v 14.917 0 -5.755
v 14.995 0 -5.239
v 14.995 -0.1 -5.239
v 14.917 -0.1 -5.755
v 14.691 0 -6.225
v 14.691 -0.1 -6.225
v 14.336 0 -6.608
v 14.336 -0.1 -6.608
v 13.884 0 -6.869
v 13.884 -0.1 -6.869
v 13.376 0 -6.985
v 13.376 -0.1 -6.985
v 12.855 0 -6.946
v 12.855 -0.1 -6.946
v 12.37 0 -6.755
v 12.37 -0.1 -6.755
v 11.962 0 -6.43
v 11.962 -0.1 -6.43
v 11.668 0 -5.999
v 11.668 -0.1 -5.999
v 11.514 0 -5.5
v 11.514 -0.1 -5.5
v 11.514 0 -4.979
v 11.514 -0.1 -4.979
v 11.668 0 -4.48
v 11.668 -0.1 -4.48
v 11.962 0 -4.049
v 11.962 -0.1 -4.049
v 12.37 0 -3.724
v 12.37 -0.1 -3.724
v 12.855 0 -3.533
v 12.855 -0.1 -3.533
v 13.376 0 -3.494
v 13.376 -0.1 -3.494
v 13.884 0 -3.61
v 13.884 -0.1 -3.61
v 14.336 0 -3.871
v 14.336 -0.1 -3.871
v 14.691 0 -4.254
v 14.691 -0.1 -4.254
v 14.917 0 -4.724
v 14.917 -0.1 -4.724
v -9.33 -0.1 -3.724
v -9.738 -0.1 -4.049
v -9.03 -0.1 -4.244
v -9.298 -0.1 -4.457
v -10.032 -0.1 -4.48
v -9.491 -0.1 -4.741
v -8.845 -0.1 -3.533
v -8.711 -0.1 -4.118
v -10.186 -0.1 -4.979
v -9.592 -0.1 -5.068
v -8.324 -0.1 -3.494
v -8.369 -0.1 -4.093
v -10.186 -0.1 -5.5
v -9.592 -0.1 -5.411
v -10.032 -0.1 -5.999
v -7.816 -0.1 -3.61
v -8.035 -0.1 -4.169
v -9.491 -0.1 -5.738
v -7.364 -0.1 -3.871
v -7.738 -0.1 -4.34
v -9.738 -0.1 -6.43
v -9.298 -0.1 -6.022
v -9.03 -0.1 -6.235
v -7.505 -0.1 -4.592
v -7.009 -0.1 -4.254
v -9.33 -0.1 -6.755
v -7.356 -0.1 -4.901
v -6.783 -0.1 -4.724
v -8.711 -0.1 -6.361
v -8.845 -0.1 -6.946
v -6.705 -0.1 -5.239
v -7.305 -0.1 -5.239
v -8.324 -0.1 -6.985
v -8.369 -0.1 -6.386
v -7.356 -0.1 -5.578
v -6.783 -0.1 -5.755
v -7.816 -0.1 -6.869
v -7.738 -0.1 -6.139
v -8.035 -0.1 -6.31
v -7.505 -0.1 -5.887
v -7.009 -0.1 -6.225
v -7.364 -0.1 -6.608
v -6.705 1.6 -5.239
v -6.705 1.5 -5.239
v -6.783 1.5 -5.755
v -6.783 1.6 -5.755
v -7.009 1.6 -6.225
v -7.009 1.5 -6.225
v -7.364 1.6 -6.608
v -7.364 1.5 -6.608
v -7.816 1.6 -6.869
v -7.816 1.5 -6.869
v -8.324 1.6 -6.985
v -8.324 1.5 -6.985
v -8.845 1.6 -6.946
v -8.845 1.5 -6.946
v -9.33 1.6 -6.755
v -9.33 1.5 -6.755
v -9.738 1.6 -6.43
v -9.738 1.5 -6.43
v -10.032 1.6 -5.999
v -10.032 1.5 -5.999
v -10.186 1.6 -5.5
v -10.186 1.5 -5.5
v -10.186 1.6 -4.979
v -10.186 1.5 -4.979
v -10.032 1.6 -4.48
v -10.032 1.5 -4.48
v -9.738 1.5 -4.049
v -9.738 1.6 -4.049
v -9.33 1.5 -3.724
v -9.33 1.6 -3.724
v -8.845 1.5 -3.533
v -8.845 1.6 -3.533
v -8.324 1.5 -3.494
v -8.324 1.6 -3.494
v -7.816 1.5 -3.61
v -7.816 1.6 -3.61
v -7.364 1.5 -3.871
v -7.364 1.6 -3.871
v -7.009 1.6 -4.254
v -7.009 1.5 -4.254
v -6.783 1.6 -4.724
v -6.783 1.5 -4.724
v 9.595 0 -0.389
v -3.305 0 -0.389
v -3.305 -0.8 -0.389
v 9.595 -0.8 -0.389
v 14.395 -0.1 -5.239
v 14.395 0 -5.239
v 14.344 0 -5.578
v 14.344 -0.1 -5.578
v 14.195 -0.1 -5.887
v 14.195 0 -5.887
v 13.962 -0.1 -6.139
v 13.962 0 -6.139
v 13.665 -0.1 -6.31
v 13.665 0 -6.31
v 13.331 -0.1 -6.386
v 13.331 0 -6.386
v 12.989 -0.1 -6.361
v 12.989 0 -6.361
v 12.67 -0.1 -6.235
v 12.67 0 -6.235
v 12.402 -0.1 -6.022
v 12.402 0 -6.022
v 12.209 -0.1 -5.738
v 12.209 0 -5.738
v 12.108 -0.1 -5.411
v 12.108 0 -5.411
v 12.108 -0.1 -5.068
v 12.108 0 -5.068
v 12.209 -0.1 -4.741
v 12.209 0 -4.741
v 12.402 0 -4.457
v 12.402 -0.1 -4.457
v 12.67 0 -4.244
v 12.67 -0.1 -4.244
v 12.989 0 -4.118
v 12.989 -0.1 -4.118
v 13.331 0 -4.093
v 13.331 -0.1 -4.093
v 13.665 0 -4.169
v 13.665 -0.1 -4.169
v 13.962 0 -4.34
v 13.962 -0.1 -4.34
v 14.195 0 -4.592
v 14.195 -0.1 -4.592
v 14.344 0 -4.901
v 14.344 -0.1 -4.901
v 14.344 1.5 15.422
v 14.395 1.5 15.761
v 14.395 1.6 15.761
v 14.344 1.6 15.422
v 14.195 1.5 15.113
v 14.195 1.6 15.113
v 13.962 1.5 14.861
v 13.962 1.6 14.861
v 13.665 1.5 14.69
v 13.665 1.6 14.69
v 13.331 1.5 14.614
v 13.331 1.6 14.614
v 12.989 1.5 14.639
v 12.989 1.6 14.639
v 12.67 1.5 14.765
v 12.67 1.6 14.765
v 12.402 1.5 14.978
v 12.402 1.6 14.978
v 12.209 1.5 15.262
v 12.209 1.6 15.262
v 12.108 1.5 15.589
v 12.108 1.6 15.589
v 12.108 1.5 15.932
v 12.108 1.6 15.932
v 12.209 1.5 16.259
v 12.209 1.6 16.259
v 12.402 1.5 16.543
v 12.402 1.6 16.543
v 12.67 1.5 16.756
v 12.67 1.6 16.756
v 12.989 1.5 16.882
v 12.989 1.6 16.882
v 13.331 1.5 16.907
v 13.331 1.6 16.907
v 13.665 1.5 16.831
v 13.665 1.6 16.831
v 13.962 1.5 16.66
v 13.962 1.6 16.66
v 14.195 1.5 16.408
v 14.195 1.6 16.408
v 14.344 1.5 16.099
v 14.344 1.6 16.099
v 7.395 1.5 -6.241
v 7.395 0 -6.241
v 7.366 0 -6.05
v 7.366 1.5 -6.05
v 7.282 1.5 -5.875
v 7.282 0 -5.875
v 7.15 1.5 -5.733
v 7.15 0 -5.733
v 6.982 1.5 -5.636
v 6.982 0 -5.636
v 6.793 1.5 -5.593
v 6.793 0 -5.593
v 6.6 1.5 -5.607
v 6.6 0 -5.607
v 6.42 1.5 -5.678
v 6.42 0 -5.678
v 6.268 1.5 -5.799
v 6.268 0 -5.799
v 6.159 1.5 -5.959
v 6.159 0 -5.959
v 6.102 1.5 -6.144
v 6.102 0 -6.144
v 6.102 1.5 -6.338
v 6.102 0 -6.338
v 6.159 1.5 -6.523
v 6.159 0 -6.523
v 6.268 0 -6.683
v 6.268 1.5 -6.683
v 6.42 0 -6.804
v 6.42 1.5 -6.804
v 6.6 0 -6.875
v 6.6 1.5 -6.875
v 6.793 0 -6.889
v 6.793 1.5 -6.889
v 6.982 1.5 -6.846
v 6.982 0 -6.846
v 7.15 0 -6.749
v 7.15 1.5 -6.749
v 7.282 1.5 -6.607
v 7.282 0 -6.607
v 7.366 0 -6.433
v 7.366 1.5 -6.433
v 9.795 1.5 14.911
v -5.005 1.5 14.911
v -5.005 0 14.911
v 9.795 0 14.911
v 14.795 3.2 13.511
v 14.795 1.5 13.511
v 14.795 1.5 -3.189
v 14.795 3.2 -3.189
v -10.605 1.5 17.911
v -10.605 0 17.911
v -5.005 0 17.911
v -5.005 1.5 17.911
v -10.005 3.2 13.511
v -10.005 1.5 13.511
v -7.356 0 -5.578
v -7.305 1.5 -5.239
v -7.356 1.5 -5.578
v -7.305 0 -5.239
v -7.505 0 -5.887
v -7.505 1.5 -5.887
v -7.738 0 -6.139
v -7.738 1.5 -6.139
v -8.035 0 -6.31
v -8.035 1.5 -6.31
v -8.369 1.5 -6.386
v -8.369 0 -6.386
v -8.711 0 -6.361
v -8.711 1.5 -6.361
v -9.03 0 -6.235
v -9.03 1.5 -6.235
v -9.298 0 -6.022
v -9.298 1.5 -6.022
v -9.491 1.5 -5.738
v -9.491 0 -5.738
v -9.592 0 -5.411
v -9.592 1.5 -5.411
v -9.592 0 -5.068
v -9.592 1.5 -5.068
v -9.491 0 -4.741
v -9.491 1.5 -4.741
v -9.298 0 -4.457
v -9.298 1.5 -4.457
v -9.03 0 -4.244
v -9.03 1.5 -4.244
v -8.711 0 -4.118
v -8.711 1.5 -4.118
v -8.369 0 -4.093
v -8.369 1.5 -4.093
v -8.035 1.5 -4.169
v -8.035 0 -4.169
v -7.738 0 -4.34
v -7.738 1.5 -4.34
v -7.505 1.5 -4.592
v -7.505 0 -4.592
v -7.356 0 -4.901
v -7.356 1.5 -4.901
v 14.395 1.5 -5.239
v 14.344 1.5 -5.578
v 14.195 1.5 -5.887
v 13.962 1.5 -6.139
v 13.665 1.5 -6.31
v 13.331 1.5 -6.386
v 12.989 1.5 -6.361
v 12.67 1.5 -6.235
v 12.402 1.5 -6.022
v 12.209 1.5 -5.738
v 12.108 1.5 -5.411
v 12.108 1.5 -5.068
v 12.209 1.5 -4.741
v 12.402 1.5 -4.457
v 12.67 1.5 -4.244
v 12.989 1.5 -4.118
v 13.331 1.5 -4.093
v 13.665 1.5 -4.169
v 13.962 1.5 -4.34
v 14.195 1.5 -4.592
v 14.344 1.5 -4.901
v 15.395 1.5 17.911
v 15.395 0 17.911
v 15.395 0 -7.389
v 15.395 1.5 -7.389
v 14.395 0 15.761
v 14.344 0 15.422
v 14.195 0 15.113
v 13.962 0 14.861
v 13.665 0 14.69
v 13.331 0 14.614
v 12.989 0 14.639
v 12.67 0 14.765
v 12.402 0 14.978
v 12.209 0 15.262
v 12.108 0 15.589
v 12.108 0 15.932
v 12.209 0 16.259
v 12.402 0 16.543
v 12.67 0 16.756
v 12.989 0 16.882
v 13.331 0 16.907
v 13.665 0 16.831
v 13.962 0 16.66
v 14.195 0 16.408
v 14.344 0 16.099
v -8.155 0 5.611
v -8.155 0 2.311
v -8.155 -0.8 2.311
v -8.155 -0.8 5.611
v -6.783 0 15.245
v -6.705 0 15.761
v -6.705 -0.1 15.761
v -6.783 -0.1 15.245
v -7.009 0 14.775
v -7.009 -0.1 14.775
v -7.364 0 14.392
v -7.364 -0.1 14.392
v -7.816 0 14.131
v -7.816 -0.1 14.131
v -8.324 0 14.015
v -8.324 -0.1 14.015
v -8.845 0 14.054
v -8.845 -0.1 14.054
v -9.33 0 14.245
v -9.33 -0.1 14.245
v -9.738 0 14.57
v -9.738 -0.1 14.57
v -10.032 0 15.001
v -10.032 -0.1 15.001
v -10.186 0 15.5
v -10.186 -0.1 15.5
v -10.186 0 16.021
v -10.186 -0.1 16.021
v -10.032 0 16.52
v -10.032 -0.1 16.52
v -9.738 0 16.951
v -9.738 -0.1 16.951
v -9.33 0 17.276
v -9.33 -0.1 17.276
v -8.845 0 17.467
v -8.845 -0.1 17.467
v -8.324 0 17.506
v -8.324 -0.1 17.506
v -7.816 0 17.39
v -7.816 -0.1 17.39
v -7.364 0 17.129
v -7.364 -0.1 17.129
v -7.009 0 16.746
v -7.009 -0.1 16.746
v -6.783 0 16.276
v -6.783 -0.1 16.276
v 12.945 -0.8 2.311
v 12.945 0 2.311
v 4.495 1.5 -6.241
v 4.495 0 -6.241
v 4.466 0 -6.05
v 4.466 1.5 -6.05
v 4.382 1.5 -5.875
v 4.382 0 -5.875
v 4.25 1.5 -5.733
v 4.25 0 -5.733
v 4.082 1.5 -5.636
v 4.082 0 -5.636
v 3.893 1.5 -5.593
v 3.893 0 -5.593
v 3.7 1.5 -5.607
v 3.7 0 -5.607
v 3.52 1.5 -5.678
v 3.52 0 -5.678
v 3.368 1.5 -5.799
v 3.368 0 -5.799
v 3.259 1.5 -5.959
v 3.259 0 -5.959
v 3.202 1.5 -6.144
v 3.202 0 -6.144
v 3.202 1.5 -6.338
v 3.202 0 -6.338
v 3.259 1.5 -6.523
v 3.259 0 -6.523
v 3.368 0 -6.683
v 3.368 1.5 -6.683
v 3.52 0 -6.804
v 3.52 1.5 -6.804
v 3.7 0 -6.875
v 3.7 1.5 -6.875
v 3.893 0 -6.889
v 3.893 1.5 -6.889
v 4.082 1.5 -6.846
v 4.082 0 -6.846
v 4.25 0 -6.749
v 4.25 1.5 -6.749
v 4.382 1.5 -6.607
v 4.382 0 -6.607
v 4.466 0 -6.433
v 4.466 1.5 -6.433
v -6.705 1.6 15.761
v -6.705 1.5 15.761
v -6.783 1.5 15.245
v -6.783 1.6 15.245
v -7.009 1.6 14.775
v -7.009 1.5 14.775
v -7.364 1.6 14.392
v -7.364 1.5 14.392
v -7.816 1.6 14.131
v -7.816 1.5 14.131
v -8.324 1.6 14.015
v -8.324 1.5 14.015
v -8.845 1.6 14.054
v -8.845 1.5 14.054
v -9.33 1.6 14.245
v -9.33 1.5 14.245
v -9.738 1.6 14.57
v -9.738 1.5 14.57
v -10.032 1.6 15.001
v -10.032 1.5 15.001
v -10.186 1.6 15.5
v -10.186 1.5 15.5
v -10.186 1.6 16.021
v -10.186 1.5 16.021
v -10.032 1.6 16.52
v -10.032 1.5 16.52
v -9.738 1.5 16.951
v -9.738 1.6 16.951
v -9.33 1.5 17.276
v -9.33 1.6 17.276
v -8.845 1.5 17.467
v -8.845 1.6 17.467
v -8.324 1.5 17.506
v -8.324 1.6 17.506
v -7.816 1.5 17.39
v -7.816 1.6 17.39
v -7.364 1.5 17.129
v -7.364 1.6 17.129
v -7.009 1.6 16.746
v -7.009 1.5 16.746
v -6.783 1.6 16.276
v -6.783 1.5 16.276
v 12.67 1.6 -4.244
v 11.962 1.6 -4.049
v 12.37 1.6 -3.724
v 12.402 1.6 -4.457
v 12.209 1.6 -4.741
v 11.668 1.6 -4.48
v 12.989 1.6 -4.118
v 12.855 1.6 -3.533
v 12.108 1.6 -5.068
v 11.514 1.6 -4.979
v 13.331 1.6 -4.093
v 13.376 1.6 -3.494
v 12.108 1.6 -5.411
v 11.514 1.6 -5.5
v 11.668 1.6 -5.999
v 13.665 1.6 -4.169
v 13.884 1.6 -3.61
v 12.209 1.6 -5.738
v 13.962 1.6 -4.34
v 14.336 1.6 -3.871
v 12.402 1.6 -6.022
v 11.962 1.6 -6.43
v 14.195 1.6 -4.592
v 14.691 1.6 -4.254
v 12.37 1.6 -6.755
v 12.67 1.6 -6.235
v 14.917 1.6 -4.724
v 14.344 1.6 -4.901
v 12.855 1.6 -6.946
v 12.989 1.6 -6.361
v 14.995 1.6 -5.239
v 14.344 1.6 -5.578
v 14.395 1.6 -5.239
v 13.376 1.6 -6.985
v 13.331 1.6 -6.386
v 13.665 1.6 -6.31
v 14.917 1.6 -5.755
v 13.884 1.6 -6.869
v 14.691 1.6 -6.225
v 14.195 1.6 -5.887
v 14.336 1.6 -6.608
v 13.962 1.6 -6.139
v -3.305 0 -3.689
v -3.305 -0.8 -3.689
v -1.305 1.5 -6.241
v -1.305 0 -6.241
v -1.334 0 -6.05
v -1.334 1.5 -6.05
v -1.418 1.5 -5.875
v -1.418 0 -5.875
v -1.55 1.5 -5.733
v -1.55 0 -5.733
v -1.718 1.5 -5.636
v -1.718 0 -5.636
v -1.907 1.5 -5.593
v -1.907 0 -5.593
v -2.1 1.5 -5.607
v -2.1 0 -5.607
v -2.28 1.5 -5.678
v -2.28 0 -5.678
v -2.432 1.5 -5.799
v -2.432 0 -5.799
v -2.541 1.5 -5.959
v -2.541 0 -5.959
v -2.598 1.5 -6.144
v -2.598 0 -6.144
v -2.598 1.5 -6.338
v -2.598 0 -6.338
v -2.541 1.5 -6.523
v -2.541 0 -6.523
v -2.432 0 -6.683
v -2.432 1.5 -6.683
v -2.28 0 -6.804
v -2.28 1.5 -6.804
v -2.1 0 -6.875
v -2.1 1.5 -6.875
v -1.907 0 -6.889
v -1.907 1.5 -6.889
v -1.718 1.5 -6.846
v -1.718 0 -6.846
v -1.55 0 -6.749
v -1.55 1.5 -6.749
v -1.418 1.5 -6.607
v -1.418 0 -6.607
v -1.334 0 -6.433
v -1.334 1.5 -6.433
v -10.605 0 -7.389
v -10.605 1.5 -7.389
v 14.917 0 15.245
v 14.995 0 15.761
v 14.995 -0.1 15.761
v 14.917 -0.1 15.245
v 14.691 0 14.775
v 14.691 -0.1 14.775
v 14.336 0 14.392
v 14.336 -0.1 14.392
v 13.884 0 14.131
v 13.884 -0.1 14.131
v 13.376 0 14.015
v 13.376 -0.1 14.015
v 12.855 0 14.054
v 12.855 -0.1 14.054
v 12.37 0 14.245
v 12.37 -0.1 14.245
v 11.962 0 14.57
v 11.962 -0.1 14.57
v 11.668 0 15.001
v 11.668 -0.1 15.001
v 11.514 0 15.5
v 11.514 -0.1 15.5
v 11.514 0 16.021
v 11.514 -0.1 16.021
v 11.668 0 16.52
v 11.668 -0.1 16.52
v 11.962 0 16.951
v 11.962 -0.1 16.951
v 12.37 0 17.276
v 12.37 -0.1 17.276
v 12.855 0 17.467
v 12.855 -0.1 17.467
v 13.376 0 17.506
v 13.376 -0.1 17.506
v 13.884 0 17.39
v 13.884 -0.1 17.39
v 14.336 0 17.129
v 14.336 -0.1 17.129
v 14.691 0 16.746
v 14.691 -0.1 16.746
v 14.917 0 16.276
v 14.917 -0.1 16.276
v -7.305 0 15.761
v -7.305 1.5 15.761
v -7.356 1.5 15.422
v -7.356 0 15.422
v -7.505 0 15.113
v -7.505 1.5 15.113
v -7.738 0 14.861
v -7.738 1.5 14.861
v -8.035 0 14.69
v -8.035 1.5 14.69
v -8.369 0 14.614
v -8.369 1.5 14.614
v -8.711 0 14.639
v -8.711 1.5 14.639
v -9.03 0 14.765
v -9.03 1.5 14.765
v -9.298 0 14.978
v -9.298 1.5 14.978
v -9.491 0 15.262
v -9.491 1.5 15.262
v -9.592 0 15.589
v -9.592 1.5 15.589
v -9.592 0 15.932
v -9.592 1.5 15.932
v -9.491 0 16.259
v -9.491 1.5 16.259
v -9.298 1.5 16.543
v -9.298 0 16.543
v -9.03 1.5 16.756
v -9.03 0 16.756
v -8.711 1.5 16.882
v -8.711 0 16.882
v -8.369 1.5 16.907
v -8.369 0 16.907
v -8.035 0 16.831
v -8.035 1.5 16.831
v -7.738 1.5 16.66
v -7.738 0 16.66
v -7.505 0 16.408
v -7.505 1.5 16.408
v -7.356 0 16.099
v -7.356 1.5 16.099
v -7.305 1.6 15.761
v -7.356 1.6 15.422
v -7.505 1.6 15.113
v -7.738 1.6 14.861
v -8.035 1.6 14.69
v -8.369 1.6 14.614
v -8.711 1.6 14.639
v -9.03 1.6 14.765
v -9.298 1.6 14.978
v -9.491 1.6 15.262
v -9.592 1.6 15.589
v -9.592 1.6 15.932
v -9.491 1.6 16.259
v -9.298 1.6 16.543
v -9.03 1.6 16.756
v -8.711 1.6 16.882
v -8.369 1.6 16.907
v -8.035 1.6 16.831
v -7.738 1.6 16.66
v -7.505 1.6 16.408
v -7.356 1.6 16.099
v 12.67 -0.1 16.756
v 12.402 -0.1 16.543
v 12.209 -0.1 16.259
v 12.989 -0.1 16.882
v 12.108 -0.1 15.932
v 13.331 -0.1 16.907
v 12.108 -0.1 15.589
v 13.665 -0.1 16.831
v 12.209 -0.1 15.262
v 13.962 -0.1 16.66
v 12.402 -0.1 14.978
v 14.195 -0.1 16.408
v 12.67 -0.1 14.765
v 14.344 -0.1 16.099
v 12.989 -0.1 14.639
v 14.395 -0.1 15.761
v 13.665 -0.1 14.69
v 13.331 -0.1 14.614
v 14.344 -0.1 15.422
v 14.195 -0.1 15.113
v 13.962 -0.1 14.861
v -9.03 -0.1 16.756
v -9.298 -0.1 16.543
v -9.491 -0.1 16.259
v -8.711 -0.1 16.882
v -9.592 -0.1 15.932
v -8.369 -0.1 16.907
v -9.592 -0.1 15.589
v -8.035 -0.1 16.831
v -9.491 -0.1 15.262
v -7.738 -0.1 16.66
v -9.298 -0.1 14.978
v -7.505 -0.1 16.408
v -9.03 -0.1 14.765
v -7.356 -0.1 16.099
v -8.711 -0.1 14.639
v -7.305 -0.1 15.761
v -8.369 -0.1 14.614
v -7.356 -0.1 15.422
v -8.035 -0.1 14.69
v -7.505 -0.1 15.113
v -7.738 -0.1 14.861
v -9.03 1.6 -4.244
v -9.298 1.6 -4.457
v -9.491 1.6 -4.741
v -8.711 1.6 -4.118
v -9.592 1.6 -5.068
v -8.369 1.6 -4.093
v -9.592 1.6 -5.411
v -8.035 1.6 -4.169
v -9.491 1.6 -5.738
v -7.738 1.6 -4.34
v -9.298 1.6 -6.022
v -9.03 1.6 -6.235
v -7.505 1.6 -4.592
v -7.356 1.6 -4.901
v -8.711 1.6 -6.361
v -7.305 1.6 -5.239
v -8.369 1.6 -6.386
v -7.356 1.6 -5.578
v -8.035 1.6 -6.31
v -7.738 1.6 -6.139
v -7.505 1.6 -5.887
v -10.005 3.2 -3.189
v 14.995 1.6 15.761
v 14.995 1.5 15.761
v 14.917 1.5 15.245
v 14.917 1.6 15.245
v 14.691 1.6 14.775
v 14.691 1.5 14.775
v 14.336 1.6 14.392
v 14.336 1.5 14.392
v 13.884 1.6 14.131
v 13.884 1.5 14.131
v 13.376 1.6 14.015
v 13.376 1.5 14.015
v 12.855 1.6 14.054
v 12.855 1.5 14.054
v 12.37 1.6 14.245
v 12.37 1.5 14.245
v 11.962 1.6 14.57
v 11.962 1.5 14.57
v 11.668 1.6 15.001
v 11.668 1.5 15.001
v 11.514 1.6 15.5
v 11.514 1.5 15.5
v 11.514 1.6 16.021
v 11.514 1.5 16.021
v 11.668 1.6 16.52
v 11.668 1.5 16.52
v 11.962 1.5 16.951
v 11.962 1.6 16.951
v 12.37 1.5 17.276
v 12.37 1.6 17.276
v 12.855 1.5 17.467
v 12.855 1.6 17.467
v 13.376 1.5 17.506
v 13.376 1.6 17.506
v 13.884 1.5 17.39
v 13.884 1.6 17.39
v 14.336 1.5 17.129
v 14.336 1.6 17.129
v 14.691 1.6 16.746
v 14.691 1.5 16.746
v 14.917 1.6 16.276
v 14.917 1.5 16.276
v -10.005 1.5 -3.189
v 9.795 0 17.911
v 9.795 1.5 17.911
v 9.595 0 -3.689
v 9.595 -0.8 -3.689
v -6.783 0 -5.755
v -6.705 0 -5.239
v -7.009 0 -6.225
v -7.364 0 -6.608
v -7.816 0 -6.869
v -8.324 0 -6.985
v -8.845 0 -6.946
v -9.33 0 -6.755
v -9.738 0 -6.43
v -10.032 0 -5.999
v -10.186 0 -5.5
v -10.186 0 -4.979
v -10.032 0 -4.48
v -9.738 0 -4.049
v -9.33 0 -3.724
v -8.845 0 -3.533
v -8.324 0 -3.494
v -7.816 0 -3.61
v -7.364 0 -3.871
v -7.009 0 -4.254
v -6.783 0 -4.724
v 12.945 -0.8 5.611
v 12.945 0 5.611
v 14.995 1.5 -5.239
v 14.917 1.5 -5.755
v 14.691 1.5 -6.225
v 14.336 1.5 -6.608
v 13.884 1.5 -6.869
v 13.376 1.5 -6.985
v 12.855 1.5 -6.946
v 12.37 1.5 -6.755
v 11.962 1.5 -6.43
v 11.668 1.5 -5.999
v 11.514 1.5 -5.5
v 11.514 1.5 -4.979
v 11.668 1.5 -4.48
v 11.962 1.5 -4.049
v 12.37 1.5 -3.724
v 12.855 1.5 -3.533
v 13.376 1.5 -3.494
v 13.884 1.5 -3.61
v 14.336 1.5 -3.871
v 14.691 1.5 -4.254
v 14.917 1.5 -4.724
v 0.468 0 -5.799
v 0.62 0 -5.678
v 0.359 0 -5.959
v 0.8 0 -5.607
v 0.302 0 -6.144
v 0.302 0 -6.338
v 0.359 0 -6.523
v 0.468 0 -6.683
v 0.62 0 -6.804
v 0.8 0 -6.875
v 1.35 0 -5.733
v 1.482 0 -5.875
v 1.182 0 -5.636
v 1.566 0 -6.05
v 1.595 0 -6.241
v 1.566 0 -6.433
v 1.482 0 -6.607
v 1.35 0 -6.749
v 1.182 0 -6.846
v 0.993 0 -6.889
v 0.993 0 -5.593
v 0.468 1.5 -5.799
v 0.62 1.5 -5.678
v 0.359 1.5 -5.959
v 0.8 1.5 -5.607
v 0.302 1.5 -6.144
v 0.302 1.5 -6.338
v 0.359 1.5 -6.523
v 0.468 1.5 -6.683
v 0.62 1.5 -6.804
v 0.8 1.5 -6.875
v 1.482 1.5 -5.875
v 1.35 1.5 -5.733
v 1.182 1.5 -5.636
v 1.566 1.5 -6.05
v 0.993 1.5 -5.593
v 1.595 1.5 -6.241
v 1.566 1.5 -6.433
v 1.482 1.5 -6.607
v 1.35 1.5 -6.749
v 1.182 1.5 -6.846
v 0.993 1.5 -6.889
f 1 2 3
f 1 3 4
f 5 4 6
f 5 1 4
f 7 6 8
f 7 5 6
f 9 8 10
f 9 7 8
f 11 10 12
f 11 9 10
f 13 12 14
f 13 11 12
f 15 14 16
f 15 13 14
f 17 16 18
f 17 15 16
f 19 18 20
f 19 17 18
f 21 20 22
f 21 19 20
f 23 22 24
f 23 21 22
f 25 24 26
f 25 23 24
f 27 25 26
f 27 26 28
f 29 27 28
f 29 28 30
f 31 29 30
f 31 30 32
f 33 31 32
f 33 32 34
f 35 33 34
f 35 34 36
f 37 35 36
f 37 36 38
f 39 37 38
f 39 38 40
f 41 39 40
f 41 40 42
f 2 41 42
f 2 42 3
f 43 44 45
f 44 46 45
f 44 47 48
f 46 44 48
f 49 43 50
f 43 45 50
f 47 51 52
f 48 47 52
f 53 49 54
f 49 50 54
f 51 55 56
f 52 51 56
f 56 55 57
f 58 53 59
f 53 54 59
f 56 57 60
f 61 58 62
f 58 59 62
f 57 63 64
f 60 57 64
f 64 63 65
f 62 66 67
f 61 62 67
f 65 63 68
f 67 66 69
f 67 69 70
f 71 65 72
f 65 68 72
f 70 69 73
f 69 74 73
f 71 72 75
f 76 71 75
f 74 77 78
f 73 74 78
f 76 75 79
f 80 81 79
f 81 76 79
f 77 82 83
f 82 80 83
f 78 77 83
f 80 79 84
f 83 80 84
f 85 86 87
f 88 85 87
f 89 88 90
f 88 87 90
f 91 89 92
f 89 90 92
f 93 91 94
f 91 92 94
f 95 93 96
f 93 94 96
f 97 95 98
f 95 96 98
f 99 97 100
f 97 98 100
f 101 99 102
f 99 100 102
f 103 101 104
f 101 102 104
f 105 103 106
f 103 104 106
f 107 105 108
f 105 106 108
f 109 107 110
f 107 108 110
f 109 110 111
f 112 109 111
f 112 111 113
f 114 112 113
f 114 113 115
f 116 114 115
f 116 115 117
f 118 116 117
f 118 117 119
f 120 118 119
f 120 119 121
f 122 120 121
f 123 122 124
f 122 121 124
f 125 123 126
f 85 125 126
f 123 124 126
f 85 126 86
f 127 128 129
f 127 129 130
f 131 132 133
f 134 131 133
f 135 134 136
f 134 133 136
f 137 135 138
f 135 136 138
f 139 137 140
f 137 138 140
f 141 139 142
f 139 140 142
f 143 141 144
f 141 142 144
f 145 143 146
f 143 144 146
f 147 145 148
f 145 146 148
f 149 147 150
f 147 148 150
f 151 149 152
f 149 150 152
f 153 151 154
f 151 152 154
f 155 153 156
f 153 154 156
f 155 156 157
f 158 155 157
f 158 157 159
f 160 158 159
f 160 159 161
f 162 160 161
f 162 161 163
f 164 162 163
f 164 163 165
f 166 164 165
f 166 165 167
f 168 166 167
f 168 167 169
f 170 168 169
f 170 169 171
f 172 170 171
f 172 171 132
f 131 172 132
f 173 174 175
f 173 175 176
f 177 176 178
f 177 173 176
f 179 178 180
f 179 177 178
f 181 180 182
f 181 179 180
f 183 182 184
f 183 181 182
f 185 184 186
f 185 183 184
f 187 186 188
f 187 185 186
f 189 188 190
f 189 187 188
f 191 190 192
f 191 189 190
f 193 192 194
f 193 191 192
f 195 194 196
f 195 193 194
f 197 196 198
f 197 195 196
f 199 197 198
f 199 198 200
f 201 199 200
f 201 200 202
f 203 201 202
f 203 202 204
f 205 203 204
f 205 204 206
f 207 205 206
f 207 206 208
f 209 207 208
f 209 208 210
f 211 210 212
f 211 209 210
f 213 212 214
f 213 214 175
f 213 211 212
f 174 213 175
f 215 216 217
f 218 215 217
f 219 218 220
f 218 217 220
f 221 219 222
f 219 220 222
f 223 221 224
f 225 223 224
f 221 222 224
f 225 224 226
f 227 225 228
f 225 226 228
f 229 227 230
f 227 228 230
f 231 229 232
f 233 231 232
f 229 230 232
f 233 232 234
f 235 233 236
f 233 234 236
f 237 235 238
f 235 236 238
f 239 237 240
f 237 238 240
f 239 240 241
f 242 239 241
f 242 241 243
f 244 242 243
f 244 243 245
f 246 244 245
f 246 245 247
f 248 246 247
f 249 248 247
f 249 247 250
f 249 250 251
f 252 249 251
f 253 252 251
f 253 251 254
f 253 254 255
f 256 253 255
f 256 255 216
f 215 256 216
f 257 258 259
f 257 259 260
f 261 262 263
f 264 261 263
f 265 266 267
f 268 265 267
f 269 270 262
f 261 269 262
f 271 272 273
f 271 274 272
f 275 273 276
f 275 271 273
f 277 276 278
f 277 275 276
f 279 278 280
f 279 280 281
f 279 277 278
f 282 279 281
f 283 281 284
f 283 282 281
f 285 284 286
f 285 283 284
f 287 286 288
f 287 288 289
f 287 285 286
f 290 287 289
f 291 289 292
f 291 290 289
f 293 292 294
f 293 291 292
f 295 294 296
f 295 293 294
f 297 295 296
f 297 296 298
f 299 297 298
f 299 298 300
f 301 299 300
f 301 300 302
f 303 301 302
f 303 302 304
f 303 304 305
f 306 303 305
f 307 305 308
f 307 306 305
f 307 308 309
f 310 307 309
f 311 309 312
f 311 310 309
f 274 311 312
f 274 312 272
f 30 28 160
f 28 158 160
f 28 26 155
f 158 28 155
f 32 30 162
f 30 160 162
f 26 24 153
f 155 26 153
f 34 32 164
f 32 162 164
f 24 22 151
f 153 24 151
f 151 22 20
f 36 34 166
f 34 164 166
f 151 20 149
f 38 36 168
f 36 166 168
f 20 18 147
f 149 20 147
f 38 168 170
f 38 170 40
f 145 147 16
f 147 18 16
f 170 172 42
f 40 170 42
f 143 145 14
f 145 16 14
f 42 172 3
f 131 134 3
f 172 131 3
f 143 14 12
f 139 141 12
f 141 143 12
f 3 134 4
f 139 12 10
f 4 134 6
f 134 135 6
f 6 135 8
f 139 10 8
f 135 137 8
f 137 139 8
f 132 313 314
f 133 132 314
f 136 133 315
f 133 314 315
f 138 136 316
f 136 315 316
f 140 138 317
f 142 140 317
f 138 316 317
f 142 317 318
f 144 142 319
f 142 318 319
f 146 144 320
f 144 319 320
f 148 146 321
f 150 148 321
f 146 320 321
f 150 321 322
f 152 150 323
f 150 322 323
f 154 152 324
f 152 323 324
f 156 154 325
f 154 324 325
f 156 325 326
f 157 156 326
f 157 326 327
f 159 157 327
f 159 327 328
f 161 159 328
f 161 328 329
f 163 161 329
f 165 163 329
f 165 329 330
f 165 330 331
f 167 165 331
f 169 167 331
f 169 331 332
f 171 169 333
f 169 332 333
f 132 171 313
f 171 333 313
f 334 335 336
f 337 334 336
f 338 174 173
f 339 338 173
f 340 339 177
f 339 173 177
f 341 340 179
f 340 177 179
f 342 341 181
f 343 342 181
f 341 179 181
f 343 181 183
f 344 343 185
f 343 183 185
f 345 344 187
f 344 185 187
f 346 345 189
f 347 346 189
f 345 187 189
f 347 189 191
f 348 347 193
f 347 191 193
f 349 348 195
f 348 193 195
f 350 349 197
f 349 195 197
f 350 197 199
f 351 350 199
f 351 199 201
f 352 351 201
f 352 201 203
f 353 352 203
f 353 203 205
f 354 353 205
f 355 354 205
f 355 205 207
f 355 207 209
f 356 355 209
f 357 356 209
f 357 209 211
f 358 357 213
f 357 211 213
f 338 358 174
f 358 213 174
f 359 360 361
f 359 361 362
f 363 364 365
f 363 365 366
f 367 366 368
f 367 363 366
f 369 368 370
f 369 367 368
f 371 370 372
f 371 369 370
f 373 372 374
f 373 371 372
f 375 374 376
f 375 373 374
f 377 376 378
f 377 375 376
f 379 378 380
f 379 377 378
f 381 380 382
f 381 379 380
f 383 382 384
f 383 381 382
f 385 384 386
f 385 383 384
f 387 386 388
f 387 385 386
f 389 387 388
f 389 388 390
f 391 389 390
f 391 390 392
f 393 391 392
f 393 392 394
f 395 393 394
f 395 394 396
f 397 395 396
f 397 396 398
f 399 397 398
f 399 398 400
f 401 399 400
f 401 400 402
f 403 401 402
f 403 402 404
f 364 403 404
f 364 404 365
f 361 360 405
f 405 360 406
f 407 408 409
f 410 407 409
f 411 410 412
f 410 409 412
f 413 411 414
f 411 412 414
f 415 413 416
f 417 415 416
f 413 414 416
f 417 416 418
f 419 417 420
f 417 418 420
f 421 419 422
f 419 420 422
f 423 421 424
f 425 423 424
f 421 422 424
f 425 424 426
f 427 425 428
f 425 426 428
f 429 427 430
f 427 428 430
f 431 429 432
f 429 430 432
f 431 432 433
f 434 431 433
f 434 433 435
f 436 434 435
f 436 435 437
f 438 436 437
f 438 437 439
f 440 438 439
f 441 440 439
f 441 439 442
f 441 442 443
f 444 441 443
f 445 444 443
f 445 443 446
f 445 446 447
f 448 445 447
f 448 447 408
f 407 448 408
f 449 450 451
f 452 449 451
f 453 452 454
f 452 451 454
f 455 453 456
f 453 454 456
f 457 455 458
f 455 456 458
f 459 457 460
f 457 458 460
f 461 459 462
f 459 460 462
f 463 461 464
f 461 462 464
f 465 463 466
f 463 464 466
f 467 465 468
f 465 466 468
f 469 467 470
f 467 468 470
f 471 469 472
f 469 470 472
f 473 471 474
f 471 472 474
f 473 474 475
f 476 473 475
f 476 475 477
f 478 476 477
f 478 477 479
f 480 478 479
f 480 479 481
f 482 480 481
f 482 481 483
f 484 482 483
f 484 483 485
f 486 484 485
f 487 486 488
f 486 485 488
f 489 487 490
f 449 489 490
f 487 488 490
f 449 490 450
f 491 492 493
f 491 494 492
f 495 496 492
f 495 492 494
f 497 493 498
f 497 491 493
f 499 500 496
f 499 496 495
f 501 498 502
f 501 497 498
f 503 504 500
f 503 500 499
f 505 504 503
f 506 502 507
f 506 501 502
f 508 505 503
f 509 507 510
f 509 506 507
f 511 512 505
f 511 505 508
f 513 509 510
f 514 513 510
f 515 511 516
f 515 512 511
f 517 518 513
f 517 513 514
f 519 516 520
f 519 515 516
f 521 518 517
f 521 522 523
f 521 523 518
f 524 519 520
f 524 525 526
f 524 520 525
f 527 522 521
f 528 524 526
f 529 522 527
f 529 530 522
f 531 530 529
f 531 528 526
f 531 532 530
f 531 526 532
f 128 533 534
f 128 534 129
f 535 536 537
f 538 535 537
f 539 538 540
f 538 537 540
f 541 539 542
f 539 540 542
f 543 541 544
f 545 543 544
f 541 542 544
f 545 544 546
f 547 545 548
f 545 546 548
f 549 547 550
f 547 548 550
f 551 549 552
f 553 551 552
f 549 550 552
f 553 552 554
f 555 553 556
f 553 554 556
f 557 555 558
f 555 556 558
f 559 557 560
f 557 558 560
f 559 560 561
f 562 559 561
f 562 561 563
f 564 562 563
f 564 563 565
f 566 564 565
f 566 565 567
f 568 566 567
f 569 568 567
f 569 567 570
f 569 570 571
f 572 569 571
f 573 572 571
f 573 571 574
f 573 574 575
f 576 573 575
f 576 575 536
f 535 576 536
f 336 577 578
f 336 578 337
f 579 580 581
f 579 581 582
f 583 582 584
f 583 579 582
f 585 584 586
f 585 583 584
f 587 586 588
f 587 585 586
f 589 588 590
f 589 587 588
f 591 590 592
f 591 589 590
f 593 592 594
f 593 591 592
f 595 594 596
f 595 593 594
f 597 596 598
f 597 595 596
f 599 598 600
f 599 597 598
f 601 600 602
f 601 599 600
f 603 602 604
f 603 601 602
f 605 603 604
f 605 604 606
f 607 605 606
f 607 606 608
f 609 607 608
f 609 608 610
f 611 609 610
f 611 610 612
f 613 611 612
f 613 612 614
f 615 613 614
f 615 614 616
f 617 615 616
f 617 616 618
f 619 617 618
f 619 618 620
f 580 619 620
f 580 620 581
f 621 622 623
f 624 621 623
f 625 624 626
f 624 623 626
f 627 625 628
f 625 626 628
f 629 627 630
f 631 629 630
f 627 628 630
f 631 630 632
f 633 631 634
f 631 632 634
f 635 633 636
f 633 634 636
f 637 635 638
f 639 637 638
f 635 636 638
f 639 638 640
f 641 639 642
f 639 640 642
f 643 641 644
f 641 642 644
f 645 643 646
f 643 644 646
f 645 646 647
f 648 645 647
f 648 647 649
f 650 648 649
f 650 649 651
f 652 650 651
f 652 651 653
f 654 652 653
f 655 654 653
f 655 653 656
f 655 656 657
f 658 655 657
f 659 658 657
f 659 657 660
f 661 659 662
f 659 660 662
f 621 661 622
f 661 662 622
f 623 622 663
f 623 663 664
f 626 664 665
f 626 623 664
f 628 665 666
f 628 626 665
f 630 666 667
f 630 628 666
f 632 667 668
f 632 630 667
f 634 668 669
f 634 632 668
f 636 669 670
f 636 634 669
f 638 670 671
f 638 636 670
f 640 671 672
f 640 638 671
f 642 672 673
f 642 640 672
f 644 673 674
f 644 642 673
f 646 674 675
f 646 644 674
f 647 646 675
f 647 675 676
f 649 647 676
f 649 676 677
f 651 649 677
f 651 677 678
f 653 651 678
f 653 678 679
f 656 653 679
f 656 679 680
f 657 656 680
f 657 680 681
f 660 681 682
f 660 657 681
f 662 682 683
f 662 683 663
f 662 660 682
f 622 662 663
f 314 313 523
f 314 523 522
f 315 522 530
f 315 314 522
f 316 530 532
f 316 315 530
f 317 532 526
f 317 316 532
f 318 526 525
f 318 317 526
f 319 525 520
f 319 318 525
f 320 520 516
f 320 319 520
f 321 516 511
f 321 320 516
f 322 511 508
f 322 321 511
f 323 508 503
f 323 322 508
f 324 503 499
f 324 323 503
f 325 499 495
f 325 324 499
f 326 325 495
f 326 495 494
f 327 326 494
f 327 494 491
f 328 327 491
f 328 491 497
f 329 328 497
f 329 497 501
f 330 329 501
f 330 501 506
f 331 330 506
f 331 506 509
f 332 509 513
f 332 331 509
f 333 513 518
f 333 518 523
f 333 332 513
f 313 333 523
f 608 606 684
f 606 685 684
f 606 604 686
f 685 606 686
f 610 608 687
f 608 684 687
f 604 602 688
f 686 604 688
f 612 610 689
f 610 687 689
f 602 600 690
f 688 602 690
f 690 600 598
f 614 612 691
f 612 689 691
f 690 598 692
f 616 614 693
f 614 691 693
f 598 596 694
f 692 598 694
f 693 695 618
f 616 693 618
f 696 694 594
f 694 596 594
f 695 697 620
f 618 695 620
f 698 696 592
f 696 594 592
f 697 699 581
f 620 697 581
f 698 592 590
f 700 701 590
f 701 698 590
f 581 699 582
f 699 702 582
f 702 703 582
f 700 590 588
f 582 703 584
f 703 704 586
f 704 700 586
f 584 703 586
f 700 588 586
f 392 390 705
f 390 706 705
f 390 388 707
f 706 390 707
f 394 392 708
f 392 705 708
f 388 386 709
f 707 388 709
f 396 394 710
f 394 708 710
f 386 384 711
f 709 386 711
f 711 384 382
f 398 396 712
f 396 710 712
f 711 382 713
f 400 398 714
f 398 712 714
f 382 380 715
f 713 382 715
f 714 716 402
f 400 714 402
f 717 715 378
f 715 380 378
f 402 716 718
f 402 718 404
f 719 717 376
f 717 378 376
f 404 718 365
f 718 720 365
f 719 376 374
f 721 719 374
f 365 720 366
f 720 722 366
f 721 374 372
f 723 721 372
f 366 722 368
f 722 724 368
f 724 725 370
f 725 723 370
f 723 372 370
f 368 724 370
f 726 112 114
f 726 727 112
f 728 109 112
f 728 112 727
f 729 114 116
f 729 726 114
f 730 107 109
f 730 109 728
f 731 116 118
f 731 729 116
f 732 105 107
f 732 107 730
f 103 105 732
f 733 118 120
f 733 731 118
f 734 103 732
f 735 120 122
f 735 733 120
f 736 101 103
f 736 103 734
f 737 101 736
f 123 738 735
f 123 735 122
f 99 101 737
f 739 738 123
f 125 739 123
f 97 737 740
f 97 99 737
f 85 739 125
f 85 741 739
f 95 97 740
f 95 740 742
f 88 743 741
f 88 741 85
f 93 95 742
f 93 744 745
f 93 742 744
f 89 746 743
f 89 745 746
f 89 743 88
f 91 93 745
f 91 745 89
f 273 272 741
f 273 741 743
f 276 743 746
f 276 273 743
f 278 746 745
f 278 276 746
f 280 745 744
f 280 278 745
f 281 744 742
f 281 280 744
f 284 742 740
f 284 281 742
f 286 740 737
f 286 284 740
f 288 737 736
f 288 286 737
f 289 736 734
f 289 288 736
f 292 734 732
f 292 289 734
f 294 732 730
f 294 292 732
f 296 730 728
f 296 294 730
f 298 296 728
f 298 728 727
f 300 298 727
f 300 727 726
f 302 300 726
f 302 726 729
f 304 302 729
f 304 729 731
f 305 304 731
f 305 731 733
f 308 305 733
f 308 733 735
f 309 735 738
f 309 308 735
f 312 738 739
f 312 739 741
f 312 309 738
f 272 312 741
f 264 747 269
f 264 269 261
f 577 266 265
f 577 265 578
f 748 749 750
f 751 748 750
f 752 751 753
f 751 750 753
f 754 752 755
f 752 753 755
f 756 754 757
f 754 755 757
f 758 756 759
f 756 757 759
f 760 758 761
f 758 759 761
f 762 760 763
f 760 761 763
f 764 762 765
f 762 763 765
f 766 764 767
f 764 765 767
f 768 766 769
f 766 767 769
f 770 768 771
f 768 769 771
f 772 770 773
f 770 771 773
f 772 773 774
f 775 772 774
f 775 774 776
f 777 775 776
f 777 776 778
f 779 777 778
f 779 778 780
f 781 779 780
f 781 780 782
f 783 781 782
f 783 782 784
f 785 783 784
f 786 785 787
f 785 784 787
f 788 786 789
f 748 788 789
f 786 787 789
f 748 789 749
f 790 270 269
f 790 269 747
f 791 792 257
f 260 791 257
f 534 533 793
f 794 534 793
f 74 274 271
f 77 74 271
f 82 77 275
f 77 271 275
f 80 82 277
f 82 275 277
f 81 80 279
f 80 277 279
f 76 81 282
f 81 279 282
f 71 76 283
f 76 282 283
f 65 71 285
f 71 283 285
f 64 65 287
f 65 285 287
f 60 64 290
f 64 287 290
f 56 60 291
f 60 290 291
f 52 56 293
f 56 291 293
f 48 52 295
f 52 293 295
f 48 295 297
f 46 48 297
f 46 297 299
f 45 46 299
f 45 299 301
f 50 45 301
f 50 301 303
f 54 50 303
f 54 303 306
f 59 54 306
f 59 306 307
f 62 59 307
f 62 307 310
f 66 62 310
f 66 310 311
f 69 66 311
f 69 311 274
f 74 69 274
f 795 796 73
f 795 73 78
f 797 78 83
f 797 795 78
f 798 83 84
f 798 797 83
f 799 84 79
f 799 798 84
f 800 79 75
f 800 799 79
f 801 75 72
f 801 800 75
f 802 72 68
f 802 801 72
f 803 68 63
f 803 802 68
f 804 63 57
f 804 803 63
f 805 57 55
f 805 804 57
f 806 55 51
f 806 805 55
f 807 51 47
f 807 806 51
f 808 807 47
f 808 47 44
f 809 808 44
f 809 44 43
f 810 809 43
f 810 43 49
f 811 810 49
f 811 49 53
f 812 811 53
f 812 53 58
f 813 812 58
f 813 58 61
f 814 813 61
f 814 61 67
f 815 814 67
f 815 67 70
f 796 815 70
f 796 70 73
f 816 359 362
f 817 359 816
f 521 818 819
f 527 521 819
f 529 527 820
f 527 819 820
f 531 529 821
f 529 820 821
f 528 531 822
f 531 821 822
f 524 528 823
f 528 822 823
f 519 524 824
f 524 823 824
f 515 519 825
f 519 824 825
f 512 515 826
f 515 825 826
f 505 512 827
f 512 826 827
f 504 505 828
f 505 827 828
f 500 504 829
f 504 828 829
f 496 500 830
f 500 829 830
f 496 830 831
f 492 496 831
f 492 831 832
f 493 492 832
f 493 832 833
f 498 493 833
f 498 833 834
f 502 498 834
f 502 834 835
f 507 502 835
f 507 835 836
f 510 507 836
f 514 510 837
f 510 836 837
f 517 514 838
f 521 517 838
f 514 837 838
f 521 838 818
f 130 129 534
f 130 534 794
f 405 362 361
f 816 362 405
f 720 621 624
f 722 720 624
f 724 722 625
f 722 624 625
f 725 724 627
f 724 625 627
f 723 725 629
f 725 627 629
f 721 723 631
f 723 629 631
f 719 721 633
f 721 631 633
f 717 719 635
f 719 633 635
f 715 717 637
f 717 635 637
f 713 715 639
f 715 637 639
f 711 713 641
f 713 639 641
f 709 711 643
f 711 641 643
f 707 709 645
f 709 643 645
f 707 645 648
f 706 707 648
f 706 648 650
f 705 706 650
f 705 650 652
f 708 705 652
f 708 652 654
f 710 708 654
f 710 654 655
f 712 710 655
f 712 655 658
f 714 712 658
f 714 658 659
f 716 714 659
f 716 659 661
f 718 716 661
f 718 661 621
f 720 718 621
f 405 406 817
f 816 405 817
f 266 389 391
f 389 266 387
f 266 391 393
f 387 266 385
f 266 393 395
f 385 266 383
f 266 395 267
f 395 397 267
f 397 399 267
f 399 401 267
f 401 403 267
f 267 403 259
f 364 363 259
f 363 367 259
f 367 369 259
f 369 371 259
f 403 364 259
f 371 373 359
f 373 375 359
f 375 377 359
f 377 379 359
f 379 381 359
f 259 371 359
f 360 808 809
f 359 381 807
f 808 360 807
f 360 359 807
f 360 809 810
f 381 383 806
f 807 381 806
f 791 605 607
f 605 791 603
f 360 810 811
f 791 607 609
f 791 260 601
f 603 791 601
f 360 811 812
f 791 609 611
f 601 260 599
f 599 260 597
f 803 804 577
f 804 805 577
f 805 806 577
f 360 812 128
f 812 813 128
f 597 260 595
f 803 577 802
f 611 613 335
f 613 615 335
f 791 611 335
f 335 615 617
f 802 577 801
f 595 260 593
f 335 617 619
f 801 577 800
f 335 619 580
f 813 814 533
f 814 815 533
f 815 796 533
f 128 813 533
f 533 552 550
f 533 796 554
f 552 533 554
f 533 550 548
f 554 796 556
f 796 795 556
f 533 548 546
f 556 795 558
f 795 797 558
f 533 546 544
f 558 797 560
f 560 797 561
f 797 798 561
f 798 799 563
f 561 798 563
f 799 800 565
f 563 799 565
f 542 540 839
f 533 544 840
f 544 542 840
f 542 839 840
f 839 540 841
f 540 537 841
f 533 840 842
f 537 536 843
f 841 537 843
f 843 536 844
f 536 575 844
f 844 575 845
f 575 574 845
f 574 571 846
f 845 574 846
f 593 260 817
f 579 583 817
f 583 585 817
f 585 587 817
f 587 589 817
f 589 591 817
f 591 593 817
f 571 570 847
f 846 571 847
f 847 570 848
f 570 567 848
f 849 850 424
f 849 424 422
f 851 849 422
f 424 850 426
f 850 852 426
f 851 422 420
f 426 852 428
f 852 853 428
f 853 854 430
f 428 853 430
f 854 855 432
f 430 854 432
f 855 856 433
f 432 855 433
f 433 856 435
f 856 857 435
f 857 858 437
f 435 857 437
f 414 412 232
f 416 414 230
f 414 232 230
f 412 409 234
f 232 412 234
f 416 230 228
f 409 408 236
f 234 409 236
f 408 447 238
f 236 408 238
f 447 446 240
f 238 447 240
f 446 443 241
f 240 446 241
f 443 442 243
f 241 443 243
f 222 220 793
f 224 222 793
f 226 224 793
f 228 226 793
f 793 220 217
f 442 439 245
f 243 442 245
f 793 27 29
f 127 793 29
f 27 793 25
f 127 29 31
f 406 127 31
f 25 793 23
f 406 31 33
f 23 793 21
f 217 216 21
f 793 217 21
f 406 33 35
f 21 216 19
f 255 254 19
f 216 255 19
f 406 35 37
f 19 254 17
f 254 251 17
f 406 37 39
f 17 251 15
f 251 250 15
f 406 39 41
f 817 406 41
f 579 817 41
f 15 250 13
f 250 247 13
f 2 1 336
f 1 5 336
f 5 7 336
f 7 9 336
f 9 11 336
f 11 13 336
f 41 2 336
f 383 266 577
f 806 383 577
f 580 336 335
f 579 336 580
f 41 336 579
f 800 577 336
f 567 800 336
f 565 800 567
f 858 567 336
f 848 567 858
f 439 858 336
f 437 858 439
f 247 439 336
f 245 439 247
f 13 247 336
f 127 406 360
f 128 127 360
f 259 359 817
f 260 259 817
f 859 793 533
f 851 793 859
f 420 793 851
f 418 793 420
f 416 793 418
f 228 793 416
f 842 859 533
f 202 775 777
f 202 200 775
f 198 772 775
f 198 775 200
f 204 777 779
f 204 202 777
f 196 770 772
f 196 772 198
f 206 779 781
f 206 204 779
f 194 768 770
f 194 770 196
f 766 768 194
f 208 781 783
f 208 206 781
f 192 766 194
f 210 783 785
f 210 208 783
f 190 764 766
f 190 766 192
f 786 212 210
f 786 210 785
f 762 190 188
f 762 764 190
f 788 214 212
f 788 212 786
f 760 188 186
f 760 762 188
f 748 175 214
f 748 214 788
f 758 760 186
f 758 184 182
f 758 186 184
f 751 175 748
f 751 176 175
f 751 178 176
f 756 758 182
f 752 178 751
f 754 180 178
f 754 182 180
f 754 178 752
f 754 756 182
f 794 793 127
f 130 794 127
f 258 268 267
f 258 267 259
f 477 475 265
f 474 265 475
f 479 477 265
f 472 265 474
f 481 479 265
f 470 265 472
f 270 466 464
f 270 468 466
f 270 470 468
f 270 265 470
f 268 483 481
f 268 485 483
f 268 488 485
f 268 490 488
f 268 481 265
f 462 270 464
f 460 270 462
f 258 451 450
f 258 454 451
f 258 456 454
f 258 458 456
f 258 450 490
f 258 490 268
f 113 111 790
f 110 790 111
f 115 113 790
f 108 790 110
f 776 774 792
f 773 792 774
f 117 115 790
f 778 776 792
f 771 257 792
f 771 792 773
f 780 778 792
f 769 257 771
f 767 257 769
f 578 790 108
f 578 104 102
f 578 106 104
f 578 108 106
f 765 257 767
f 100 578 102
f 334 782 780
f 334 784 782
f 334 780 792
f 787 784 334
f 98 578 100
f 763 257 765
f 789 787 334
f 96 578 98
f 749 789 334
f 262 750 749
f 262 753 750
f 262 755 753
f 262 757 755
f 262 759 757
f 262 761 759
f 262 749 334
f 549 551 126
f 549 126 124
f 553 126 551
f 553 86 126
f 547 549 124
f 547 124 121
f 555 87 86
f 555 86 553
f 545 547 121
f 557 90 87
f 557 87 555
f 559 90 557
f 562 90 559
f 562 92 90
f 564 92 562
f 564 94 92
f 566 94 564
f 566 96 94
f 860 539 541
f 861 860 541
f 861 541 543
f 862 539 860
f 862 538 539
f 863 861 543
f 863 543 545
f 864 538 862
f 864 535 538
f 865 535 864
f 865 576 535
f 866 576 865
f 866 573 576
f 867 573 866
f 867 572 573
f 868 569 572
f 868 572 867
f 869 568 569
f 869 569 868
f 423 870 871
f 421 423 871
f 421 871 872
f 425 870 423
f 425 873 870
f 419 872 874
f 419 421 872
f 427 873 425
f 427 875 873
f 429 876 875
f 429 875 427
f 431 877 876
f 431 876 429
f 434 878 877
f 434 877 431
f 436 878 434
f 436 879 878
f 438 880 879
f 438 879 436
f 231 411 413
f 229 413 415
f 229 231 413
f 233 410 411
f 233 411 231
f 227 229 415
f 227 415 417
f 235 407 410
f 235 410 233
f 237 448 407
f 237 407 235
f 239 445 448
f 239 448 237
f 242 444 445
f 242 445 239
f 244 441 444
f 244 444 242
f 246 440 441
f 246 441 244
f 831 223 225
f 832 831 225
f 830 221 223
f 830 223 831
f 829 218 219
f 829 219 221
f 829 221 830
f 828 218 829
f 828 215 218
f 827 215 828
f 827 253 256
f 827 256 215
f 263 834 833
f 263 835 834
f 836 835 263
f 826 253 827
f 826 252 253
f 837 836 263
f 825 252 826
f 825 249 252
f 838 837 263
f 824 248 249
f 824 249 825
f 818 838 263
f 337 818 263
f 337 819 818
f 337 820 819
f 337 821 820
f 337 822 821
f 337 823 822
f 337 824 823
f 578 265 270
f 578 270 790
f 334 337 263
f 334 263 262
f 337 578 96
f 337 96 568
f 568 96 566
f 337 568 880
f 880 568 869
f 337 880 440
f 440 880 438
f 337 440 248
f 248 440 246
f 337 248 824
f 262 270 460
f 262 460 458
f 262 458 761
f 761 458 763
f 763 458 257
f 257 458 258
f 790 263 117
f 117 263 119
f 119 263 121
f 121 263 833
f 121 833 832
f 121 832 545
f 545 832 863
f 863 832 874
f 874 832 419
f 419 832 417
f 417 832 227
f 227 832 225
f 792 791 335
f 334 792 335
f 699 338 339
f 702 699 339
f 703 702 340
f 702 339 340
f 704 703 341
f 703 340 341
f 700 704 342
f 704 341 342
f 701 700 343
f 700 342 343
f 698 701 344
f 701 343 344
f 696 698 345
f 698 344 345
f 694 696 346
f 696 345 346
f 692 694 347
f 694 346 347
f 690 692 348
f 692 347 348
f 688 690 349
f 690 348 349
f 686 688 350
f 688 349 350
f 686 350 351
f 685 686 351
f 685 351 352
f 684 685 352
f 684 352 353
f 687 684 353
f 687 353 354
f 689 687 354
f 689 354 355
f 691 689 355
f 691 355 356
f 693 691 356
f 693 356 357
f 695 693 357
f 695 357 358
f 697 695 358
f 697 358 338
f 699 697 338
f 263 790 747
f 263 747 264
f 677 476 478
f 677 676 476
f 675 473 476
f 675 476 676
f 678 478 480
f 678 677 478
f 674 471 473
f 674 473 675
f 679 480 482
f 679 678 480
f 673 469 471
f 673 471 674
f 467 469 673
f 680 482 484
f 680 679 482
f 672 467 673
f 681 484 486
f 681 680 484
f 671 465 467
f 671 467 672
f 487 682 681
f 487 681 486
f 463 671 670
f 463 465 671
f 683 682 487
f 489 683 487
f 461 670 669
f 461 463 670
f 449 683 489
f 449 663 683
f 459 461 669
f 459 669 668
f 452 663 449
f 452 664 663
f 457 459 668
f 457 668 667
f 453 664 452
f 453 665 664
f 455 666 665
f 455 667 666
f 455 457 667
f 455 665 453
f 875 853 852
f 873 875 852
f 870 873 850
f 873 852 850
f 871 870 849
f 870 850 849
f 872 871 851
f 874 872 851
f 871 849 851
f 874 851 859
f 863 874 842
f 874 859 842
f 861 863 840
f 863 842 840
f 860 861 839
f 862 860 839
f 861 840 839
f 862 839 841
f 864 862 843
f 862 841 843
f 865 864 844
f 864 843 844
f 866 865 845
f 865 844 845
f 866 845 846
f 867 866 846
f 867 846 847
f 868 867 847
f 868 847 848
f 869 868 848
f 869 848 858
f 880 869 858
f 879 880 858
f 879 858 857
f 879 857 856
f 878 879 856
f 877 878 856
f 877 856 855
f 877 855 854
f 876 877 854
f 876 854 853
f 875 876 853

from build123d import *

# Parameters (mm, degrees)
SKETCH1_W                = 26
SKETCH1_H                = 25.3
BOSS_EXTRUDE1_DEPTH      = 1.5
SKETCH2_W                = 14.8
SKETCH2_H                = 3
CUT_EXTRUDE1_DEPTH       = 1.5
SKETCH3_R                = 1.15
CUT_EXTRUDE2_DEPTH       = 1.5
SKETCH4_R                = 1.75
SKETCH4_R_2              = 1.15
BOSS_EXTRUDE3_DEPTH      = 0.1
BOSS_EXTRUDE3_DEPTH_BACK = 1.6
SKETCH6_W                = 24.8
SKETCH6_H                = 16.7
BOSS_EXTRUDE4_DEPTH      = 1.7
SKETCH7_W                = 21.1
SKETCH7_H                = 3.3
SKETCH7_W_2              = 12.9
BOSS_EXTRUDE5_DEPTH      = 0.8
SKETCH8_R                = 0.65
CUT_EXTRUDE4_DEPTH       = 4.2


with BuildPart() as part:
    # Sketch1 → Boss-Extrude1 (new body)
    with BuildSketch(Plane(origin=(0, 0, 0), x_dir=(1, 0, 0), z_dir=(0, 1, 0))):
        with Locations((2.394736842, -5.260526316)):
            Rectangle(SKETCH1_W, SKETCH1_H)
    extrude(amount=BOSS_EXTRUDE1_DEPTH)

    # Sketch2 → Cut-Extrude1 (cut)
    with BuildSketch(Plane(origin=(0, 1.5, 0), x_dir=(1, 0, 0), z_dir=(0, 1, 0))):
        with Locations((2.394736842, -16.410526316)):
            Rectangle(SKETCH2_W, SKETCH2_H)
    extrude(amount=-CUT_EXTRUDE1_DEPTH, mode=Mode.SUBTRACT)

    # Sketch3 → Cut-Extrude2 (cut)
    with BuildSketch(Plane(origin=(0, 1.5, 0), x_dir=(1, 0, 0), z_dir=(0, 1, 0))):
        with Locations((-8.455263158, 5.239473684)):
            Circle(SKETCH3_R)
        with Locations((13.244736842, 5.239473684)):
            Circle(SKETCH3_R)
        with Locations((13.244736842, -15.760526316)):
            Circle(SKETCH3_R)
        with Locations((-8.455263158, -15.760526316)):
            Circle(SKETCH3_R)
    extrude(amount=-CUT_EXTRUDE2_DEPTH, mode=Mode.SUBTRACT)

    # Sketch4 → Boss-Extrude3 (add, two sides)
    with BuildSketch(Plane(origin=(0, 1.5, 0), x_dir=(1, 0, 0), z_dir=(0, 1, 0))) as boss_extrude3_sk:
        with Locations((-8.455263158, 5.239473684)):
            Circle(SKETCH4_R)
        with Locations((-8.455263158, 5.239473684)):
            Circle(SKETCH4_R_2, mode=Mode.SUBTRACT)
        with Locations((13.244736842, 5.239473684)):
            Circle(SKETCH4_R)
        with Locations((13.244736842, 5.239473684)):
            Circle(SKETCH4_R_2, mode=Mode.SUBTRACT)
        with Locations((13.244736842, -15.760526316)):
            Circle(SKETCH4_R)
        with Locations((13.244736842, -15.760526316)):
            Circle(SKETCH4_R_2, mode=Mode.SUBTRACT)
        with Locations((-8.455263158, -15.760526316)):
            Circle(SKETCH4_R)
        with Locations((-8.455263158, -15.760526316)):
            Circle(SKETCH4_R_2, mode=Mode.SUBTRACT)
    extrude(amount=BOSS_EXTRUDE3_DEPTH)
    extrude(boss_extrude3_sk.sketch, amount=-BOSS_EXTRUDE3_DEPTH_BACK)

    # Sketch6 → Boss-Extrude4 (add)
    with BuildSketch(Plane(origin=(0, 1.5, 0), x_dir=(1, 0, 0), z_dir=(0, 1, 0))):
        with Locations((2.394736842, -5.160526316)):
            Rectangle(SKETCH6_W, SKETCH6_H)
    extrude(amount=BOSS_EXTRUDE4_DEPTH)

    # Sketch7 → Boss-Extrude5 (add)
    with BuildSketch(Plane.XZ):
        with Locations((2.394736842, 3.960526316)):
            Rectangle(SKETCH7_W, SKETCH7_H)
        with Locations((3.144736842, -2.039473684)):
            Rectangle(SKETCH7_W_2, SKETCH7_H)
    extrude(amount=BOSS_EXTRUDE5_DEPTH)

    # Sketch8 → Cut-Extrude4 (cut, through all)
    with BuildSketch(Plane.XZ):
        with Locations((-1.955263158, -6.241133994)):
            Circle(SKETCH8_R)
        with Locations((0.944736842, -6.241133994)):
            Circle(SKETCH8_R)
        with Locations((3.844736842, -6.241133994)):
            Circle(SKETCH8_R)
        with Locations((6.744736842, -6.241133994)):
            Circle(SKETCH8_R)
    extrude(amount=-CUT_EXTRUDE4_DEPTH, mode=Mode.SUBTRACT)


solid = part.part
